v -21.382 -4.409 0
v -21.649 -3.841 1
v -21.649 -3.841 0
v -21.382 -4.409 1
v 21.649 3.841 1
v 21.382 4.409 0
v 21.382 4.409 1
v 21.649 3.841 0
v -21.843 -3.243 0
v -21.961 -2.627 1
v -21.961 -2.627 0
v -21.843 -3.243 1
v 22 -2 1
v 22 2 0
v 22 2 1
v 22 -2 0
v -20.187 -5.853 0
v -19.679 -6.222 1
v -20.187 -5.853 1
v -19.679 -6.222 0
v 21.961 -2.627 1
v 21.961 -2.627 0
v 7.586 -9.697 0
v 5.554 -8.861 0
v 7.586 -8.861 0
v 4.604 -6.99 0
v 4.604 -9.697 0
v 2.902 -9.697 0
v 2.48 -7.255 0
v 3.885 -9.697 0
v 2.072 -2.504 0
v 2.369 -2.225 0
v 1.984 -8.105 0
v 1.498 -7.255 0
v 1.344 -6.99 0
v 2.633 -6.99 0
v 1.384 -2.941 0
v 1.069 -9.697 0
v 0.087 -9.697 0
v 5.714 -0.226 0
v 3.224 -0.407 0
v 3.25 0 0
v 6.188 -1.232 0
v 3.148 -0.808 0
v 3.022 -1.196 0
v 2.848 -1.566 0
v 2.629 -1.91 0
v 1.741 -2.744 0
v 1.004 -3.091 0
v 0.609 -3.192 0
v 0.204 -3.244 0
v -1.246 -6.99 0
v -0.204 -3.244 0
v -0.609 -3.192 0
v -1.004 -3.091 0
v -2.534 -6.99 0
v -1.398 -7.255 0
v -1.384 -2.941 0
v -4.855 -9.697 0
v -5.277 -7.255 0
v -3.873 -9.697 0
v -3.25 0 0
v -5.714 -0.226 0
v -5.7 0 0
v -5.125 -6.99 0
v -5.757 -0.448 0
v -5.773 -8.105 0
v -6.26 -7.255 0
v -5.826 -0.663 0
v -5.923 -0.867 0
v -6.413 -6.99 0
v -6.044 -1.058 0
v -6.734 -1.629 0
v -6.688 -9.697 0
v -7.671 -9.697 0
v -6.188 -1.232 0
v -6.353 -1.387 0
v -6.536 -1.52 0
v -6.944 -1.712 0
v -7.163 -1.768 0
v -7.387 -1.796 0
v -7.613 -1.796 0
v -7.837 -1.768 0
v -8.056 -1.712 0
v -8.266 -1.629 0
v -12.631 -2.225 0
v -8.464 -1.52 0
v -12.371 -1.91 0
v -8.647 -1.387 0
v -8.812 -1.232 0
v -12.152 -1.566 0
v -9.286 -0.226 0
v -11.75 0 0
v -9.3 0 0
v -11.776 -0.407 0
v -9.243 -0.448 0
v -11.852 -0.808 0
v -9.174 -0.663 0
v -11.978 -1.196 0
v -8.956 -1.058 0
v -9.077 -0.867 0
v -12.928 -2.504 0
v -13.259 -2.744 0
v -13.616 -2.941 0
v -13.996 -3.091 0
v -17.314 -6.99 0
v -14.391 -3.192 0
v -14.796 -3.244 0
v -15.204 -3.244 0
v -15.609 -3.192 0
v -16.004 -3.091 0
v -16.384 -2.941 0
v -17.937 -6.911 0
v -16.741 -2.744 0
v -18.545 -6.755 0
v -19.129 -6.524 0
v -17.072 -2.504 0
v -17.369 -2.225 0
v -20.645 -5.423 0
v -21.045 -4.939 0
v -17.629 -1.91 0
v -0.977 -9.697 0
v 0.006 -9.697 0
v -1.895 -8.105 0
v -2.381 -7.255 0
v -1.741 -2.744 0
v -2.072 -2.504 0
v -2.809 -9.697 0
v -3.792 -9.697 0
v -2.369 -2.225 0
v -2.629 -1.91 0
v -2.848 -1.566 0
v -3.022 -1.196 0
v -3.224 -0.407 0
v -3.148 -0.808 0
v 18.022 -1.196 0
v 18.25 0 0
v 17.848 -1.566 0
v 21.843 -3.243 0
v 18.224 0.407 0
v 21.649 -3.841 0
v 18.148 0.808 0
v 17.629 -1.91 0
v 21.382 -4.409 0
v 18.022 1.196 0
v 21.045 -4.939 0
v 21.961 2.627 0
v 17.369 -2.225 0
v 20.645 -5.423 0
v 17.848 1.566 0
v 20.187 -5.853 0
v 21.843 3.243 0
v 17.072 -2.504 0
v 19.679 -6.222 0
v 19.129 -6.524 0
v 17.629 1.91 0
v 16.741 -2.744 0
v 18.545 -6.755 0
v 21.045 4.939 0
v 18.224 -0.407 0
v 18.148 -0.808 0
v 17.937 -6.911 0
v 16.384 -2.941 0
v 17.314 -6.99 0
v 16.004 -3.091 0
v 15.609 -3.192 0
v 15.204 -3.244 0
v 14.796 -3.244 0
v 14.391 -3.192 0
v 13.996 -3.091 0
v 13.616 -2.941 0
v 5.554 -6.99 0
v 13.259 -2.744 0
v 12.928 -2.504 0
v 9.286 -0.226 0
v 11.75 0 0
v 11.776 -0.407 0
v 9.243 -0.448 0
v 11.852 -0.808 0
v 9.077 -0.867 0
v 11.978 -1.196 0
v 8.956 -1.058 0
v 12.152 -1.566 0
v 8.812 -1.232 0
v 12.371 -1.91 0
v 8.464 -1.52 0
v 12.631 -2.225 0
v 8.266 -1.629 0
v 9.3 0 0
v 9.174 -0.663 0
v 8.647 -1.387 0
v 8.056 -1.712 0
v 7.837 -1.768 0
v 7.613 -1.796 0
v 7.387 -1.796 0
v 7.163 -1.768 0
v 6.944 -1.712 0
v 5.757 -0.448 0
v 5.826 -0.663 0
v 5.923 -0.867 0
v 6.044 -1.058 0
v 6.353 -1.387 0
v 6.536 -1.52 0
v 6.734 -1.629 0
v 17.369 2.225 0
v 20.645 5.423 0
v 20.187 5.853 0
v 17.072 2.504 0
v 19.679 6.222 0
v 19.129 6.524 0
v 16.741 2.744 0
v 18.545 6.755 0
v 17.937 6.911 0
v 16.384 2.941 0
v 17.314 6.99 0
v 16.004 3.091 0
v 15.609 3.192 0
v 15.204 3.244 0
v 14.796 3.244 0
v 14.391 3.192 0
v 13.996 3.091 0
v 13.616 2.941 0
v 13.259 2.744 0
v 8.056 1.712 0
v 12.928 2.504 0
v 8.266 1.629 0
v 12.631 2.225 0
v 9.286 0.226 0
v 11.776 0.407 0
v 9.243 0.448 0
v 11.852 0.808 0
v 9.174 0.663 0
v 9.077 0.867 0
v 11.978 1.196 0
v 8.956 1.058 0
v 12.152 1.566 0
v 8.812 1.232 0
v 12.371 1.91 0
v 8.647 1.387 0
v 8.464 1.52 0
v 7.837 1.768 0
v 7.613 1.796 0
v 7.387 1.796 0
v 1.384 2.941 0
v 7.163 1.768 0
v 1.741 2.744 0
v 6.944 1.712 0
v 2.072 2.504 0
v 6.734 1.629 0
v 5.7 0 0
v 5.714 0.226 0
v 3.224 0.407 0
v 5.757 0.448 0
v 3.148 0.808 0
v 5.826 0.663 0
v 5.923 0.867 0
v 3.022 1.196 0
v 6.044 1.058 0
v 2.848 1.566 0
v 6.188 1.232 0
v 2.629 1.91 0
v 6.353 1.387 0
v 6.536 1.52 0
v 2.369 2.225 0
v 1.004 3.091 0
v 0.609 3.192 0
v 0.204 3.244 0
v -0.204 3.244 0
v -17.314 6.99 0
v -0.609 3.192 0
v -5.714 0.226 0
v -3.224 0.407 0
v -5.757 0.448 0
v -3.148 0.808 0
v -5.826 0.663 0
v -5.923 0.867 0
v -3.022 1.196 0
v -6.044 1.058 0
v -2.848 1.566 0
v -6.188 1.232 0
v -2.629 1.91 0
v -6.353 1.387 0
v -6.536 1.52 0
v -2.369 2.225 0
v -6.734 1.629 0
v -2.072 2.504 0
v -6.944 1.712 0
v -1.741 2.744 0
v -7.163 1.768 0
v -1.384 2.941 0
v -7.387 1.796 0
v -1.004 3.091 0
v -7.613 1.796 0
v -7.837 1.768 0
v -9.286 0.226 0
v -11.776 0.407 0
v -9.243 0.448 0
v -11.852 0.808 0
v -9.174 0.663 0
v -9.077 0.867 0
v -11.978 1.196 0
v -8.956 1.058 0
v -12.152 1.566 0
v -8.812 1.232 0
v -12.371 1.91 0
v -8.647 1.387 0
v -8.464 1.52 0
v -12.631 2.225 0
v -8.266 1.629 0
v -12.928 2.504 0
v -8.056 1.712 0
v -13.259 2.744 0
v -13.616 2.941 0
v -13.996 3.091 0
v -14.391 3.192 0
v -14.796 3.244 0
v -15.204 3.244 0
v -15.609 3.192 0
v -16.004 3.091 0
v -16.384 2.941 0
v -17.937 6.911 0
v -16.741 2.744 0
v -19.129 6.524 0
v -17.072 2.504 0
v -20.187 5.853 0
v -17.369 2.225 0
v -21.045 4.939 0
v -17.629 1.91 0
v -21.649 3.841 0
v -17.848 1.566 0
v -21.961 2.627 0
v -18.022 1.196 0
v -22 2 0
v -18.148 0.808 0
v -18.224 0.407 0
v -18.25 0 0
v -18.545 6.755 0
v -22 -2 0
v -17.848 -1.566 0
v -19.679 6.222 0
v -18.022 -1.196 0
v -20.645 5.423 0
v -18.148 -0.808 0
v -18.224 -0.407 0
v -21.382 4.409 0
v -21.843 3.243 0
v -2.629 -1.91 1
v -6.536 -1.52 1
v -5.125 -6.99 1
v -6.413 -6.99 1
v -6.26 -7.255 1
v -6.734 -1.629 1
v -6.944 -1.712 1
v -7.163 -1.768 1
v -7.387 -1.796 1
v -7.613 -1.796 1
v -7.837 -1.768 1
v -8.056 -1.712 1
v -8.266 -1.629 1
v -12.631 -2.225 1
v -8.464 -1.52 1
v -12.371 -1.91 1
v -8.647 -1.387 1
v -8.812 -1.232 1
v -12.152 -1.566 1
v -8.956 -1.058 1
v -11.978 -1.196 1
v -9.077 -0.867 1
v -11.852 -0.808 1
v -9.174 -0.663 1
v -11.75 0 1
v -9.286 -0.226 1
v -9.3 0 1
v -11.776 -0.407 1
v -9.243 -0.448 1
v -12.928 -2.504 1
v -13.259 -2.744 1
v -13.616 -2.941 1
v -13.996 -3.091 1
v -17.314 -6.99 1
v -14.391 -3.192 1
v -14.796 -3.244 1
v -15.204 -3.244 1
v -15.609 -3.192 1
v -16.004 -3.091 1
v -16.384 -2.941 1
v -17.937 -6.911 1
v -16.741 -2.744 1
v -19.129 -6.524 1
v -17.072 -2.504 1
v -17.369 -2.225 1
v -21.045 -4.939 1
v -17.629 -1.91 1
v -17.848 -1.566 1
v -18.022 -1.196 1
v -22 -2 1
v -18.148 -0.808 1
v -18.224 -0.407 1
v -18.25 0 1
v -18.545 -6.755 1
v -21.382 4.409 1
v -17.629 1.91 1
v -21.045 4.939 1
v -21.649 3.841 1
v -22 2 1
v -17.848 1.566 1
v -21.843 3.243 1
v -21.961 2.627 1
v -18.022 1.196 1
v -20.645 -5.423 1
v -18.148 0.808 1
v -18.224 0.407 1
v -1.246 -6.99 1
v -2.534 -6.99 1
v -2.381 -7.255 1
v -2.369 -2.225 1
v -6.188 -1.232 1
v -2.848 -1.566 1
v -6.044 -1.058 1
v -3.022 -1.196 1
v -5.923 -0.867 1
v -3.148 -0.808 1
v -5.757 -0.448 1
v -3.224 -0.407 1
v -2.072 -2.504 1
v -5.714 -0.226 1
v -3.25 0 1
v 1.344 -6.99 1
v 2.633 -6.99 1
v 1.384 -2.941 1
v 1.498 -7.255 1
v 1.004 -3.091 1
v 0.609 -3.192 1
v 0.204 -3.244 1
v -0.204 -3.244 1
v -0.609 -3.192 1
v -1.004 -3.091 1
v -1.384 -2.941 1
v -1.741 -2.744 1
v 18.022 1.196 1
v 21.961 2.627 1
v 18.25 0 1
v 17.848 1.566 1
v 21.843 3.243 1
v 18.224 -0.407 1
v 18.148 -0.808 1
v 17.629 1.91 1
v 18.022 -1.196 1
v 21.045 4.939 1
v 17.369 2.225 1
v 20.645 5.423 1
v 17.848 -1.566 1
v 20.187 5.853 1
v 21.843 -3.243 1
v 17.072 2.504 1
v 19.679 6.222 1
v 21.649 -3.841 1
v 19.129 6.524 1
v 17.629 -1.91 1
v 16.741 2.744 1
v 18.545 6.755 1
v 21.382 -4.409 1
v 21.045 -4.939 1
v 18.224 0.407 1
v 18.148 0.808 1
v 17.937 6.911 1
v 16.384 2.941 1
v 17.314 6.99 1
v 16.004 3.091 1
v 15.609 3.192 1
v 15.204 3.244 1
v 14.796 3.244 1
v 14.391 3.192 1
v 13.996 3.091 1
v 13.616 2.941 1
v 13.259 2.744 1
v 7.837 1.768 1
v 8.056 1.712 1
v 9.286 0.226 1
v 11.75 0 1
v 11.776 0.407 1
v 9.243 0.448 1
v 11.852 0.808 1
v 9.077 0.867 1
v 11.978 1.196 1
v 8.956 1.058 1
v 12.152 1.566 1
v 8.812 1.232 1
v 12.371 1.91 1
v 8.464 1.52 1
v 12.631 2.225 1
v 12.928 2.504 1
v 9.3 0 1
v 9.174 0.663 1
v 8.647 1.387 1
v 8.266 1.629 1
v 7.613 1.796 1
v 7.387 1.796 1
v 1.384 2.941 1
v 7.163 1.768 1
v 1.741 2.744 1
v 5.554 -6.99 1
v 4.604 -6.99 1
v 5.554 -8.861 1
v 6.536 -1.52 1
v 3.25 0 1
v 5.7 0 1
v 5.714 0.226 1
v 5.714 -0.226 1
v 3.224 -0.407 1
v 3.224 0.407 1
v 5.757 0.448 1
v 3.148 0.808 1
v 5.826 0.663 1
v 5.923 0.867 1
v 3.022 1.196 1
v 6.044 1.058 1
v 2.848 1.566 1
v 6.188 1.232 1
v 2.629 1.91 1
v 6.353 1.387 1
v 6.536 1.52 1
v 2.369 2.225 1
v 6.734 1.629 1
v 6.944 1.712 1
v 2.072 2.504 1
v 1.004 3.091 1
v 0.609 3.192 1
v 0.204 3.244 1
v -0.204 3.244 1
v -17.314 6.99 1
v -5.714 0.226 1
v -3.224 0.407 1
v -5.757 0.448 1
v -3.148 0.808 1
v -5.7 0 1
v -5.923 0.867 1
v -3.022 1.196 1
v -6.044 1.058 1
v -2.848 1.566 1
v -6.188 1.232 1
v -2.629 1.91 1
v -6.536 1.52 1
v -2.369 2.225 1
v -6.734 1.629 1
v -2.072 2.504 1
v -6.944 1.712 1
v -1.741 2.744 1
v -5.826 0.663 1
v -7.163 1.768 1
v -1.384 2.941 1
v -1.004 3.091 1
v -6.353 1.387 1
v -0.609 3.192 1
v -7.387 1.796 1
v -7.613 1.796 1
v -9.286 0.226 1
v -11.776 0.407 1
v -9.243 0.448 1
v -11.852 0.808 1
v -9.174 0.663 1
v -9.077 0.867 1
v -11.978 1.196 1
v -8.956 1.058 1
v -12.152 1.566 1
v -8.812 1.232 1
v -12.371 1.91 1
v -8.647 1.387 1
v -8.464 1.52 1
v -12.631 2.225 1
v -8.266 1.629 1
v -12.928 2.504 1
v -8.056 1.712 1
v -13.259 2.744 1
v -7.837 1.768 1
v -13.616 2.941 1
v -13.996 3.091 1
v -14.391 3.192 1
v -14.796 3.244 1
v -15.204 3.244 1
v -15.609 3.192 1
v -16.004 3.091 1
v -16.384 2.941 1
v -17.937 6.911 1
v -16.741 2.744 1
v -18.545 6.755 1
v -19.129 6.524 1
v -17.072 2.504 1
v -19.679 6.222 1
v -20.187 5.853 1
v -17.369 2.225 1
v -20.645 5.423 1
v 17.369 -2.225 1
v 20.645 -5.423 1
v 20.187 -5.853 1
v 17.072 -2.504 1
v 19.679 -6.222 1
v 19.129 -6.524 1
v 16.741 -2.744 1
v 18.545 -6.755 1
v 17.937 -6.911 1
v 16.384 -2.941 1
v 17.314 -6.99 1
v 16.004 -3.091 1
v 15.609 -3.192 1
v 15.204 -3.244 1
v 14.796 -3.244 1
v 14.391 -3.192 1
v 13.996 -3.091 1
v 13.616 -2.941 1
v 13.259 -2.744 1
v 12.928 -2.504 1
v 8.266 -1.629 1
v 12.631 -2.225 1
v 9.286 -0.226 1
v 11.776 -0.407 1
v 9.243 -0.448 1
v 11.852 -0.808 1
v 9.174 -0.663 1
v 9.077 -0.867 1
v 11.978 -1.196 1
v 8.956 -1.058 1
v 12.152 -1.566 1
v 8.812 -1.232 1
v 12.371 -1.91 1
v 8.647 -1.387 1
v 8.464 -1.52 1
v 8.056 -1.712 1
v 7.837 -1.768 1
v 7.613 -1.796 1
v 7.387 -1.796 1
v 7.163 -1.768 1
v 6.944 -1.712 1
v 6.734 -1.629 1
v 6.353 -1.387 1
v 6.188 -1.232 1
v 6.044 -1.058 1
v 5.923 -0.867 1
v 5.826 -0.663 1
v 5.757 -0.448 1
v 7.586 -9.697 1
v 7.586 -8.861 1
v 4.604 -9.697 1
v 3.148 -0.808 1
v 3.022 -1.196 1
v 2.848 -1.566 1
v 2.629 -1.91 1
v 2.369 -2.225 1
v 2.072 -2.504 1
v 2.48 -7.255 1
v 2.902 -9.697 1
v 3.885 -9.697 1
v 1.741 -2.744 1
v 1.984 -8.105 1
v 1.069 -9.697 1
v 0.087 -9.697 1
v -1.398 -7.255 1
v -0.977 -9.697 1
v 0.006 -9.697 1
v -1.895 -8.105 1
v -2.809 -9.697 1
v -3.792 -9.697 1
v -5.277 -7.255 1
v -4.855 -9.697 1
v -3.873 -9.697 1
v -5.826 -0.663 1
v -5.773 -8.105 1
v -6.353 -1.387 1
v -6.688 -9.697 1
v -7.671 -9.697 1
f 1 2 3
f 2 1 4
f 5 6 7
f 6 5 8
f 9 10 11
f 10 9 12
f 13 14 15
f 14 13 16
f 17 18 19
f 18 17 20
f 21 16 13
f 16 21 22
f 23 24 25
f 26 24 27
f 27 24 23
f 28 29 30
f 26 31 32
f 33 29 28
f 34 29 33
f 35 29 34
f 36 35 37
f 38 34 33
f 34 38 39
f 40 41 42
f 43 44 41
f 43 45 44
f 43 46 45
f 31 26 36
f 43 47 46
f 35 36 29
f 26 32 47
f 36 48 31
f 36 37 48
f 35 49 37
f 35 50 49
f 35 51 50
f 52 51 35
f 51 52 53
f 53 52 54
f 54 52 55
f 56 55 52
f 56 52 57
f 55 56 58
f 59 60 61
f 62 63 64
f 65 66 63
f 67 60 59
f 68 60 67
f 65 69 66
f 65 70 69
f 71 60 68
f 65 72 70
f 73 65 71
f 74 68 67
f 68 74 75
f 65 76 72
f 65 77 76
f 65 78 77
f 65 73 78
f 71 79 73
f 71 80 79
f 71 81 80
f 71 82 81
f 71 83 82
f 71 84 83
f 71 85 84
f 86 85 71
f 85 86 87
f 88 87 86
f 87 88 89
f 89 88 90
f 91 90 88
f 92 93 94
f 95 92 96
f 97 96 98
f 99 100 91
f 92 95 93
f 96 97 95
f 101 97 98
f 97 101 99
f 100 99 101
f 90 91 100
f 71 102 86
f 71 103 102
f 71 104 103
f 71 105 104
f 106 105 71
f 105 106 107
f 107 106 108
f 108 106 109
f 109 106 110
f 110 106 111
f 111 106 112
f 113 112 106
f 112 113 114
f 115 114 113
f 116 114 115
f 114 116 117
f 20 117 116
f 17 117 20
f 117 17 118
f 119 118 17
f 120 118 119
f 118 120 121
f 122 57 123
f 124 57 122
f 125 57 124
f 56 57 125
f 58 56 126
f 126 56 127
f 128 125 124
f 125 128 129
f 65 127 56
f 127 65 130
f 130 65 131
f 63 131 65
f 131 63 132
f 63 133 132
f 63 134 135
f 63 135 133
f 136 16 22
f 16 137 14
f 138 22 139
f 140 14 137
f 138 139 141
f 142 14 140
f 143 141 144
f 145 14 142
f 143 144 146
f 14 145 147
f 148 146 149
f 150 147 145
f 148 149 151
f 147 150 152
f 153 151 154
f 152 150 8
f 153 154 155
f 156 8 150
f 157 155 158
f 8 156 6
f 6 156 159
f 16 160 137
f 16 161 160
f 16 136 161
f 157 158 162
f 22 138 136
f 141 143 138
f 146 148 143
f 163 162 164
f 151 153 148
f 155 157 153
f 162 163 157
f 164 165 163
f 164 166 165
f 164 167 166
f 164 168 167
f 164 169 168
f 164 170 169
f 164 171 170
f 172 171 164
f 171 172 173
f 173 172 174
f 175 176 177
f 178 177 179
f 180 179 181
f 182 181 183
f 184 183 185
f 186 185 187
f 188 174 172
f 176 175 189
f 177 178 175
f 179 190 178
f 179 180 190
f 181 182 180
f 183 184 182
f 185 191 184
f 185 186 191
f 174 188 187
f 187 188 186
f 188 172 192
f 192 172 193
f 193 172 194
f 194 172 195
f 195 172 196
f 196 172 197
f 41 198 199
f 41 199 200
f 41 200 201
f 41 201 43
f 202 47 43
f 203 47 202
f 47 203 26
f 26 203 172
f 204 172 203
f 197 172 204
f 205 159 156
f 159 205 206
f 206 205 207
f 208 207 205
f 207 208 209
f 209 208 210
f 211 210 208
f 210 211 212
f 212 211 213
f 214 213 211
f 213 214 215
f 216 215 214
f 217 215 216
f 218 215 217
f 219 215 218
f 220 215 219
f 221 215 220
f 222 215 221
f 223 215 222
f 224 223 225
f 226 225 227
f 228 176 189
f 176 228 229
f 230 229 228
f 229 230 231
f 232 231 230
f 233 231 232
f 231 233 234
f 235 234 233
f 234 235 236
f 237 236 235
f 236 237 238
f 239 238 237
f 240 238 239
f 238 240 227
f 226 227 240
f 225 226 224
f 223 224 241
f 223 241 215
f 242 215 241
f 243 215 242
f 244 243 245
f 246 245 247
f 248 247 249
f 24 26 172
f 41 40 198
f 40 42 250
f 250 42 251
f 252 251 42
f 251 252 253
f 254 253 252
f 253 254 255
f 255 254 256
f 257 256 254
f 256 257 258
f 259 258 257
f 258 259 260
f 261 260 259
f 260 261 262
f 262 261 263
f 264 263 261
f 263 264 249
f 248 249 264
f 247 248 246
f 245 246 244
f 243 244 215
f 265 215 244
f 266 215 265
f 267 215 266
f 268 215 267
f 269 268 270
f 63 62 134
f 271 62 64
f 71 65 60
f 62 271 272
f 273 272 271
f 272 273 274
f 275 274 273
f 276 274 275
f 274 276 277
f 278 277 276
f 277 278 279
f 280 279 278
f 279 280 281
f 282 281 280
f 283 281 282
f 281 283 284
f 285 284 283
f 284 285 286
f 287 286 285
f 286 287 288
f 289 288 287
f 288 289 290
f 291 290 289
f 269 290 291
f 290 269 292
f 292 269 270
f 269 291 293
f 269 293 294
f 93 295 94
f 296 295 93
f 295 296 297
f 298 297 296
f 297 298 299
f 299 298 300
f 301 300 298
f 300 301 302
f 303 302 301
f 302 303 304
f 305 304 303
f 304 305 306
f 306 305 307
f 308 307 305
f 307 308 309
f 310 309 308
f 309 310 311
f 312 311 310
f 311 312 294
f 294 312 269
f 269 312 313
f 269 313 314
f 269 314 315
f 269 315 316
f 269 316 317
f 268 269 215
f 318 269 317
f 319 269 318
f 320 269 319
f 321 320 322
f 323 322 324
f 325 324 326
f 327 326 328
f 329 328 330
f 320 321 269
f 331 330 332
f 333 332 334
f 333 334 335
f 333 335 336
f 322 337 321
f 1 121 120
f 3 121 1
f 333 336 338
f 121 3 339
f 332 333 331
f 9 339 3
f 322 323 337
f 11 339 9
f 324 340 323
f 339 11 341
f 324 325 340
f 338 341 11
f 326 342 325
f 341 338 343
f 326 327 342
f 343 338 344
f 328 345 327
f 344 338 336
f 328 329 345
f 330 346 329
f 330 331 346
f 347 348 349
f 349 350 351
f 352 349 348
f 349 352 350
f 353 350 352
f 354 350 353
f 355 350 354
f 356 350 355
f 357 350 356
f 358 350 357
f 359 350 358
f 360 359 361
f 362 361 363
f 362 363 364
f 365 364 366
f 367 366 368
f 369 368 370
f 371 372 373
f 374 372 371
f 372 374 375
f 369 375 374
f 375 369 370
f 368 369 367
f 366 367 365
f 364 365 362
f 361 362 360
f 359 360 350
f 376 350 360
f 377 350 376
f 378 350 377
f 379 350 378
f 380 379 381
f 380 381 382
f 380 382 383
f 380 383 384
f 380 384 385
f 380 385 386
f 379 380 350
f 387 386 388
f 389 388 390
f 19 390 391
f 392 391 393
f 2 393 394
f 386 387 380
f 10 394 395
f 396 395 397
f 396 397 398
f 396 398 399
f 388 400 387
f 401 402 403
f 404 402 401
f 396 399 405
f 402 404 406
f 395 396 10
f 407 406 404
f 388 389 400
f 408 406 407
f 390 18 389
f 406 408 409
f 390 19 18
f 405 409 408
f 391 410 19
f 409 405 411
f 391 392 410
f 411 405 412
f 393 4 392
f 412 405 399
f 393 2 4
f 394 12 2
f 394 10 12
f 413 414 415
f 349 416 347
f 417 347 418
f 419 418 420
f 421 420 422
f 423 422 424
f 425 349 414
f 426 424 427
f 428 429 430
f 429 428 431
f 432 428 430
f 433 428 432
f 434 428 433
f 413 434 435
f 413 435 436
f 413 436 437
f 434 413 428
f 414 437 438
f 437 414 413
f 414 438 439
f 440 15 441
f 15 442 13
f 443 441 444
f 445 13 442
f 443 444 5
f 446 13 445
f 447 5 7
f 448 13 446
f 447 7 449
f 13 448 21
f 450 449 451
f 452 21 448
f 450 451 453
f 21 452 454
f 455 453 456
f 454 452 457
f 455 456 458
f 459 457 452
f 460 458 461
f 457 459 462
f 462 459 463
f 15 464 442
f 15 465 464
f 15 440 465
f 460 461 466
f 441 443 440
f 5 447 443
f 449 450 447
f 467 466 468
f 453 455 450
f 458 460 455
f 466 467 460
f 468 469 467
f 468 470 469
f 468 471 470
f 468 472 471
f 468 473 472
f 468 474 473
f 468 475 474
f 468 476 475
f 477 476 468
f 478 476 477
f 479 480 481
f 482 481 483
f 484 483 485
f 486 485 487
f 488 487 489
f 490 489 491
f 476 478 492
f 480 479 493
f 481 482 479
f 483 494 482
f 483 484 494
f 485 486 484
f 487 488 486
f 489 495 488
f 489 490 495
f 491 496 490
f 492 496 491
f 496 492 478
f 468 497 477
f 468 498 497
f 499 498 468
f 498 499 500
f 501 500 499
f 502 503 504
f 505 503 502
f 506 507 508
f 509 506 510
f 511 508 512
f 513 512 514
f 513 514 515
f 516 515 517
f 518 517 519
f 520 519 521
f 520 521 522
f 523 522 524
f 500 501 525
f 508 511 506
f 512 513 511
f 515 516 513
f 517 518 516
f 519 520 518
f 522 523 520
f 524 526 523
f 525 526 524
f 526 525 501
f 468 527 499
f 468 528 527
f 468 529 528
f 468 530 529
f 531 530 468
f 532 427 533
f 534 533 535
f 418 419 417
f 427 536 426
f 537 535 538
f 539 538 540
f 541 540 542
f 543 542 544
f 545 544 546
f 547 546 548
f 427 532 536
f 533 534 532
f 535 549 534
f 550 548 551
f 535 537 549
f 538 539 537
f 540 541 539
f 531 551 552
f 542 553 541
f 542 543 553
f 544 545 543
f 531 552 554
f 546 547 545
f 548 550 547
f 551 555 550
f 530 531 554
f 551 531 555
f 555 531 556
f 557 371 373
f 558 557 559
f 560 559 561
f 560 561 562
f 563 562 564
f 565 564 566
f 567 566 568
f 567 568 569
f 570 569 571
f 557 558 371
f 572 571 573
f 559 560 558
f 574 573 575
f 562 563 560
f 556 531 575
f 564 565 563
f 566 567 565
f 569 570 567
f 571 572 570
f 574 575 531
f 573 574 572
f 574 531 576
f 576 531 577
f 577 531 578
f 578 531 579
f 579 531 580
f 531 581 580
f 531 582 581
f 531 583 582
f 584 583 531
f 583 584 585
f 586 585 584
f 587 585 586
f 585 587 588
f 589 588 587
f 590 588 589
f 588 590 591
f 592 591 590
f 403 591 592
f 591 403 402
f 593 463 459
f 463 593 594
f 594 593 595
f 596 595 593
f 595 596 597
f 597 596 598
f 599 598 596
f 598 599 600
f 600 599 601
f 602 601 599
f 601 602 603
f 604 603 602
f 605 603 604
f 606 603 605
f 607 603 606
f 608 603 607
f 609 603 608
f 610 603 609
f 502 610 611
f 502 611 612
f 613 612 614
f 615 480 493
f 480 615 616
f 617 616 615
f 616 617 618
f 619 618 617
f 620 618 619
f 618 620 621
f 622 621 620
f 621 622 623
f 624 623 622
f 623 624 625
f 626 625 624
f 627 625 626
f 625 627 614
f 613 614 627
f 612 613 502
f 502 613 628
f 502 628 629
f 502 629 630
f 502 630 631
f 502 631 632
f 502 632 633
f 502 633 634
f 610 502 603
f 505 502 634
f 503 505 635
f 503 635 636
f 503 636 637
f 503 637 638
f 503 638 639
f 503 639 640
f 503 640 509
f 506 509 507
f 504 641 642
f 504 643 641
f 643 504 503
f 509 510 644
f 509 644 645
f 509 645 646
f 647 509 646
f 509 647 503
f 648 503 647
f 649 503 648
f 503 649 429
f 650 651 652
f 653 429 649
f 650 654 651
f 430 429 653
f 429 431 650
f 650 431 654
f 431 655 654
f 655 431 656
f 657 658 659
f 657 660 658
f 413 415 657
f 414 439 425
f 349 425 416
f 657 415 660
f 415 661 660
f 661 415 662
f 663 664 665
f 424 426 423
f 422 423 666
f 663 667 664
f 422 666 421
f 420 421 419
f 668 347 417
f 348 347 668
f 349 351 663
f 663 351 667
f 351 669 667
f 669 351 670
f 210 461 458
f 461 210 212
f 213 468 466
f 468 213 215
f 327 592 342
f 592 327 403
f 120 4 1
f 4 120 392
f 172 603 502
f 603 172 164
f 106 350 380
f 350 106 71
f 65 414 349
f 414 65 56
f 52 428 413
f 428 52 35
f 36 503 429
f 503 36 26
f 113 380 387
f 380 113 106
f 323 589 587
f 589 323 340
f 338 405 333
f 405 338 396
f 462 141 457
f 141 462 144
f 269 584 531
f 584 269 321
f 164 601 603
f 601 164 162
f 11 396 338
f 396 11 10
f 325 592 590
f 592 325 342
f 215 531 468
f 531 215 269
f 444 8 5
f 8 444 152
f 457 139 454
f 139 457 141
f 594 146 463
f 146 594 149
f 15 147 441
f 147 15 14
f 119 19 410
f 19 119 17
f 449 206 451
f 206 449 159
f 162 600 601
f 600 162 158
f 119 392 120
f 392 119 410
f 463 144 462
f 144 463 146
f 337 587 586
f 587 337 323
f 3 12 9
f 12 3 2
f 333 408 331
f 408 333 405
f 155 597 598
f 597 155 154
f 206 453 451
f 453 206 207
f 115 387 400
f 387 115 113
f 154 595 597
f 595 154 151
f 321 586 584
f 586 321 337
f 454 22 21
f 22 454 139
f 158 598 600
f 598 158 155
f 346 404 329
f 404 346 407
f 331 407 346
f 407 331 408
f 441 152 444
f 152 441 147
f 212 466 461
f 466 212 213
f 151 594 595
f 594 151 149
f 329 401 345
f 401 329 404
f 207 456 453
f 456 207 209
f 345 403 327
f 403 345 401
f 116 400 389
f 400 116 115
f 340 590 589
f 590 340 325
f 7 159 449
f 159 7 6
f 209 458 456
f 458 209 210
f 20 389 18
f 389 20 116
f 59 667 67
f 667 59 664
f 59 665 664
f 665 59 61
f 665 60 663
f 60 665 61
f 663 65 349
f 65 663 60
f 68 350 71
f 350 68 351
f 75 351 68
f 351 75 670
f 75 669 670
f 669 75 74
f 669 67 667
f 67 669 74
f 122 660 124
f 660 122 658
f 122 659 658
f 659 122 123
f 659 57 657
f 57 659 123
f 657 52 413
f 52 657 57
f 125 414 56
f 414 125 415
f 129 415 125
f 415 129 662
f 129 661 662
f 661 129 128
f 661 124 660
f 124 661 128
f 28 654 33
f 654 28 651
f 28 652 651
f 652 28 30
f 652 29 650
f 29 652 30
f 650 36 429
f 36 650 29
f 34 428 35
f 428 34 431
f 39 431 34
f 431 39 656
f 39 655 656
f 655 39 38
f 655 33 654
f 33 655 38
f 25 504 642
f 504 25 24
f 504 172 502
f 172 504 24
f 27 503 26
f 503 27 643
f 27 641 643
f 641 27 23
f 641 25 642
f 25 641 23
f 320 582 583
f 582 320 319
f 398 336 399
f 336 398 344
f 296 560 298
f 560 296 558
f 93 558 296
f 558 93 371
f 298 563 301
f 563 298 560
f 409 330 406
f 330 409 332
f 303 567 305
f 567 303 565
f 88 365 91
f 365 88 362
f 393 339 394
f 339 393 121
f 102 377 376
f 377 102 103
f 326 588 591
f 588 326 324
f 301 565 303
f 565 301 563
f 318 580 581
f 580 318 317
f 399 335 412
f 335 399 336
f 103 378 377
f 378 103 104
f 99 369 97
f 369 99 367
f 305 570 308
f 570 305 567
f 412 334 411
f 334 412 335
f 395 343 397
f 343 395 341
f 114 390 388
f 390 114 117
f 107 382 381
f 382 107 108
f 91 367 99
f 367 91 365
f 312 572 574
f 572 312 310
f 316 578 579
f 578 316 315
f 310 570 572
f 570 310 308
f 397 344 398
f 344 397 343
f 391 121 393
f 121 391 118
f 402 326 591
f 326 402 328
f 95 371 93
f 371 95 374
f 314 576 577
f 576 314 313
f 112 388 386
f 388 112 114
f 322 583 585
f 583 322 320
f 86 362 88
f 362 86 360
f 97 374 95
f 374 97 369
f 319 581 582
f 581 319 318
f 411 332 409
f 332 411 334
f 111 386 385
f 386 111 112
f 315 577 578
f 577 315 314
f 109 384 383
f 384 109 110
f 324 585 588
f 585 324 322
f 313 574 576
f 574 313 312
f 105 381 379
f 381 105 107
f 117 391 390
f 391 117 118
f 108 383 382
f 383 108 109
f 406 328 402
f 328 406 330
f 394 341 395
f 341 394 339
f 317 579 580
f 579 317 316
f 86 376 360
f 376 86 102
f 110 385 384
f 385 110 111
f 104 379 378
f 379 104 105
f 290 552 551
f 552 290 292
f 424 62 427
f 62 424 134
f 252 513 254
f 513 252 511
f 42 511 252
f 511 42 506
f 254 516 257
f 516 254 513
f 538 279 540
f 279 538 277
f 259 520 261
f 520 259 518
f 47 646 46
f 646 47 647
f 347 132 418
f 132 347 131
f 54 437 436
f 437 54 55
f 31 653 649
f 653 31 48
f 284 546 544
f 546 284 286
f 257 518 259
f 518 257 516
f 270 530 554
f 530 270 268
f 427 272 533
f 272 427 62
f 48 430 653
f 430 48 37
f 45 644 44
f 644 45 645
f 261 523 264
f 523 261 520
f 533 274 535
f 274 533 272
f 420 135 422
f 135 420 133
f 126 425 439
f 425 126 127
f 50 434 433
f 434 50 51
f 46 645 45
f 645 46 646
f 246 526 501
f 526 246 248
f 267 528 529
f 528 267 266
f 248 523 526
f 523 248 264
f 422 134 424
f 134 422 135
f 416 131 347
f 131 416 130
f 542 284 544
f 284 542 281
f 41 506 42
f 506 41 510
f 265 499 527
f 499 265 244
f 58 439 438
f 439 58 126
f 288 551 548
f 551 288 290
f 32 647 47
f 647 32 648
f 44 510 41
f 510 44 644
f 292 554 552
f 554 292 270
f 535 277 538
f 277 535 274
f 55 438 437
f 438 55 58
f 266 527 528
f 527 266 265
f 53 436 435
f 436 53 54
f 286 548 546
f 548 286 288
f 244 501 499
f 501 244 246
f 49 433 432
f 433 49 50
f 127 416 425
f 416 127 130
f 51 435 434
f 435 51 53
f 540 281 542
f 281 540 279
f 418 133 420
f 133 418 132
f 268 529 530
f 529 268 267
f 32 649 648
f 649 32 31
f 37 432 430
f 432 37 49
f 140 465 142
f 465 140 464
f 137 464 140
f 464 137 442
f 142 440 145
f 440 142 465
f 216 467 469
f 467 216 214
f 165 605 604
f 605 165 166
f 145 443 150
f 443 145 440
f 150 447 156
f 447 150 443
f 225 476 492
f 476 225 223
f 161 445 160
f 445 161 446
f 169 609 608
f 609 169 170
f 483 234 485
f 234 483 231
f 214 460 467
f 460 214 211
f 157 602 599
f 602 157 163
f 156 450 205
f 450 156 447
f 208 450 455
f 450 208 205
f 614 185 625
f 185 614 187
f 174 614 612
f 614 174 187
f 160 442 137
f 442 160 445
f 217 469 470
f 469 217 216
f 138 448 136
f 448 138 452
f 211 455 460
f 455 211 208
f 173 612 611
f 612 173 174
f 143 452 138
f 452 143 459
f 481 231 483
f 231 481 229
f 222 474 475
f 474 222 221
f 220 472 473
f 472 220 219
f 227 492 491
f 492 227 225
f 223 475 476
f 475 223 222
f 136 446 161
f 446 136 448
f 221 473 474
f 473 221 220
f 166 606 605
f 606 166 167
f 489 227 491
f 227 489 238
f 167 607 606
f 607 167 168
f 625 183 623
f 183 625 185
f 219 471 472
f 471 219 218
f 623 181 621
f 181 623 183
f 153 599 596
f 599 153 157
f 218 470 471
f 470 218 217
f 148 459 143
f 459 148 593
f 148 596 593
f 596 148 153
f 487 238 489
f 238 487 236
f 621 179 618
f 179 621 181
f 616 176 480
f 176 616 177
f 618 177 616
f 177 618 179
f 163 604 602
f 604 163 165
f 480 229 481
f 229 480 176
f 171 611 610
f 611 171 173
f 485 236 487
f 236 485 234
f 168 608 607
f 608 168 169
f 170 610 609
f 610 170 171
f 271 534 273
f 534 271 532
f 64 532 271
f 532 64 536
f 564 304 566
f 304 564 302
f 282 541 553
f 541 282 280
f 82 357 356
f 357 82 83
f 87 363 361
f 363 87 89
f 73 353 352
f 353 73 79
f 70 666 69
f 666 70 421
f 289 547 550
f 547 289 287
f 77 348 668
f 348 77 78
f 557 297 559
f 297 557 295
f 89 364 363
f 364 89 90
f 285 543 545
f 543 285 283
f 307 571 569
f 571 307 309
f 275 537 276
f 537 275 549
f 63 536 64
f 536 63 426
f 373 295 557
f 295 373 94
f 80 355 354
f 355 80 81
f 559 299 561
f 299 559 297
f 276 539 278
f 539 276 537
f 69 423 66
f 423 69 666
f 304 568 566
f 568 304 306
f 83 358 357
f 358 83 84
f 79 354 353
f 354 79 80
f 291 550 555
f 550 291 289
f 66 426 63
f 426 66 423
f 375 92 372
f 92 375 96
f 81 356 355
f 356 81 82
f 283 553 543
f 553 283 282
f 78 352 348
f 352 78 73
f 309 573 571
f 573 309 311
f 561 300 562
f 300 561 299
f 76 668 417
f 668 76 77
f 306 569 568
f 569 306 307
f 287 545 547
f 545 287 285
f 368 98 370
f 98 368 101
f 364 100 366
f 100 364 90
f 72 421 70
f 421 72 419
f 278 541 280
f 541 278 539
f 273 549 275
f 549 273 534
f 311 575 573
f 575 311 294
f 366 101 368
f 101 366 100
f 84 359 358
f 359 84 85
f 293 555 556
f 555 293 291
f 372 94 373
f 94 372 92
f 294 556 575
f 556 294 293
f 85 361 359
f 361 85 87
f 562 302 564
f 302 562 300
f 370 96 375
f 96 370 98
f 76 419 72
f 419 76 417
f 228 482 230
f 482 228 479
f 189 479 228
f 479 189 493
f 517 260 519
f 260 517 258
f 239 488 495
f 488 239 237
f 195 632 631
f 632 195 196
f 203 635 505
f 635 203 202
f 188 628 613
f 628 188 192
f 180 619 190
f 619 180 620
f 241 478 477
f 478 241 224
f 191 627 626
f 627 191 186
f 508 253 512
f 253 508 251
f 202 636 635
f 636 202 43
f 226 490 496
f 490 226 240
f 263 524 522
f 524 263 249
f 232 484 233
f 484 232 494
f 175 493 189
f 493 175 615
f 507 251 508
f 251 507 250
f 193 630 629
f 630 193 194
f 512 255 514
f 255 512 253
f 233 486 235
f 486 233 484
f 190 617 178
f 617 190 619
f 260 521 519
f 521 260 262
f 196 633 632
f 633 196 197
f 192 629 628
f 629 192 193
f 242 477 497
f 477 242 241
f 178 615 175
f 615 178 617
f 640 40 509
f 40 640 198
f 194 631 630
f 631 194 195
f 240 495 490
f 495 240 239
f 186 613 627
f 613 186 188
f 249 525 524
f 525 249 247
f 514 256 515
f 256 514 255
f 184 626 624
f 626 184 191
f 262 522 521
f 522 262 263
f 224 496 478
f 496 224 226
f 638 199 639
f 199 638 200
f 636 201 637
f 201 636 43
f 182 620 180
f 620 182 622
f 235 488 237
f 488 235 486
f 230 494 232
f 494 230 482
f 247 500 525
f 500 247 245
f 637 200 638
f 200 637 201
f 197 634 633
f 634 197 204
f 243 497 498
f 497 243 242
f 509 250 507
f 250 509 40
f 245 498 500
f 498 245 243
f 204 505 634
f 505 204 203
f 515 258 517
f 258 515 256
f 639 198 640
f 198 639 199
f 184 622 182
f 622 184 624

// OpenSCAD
$fn = 50;


difference() {
	union() {
		hull() {
			translate(v = [-17.0000000000, 2.0000000000, 0]) {
				cylinder(h = 1, r = 5);
			}
			translate(v = [17.0000000000, 2.0000000000, 0]) {
				cylinder(h = 1, r = 5);
			}
			translate(v = [-17.0000000000, -2.0000000000, 0]) {
				cylinder(h = 1, r = 5);
			}
			translate(v = [17.0000000000, -2.0000000000, 0]) {
				cylinder(h = 1, r = 5);
			}
		}
		translate(v = [0, -5, 0]) {
			linear_extrude(height = 1) {
				text(font = "DejaVu Sans Mono:style=Bold", halign = "center", size = 4.7500000000, text = "XXXL", valign = "top");
			}
		}
	}
	union() {
		translate(v = [-15.0000000000, 0.0000000000, 0]) {
			translate(v = [0, 0, -100]) {
				cylinder(h = 200, r = 3.2500000000);
			}
		}
		translate(v = [0, 0, -100]) {
			cylinder(h = 200, r = 3.2500000000);
		}
		translate(v = [15.0000000000, 0.0000000000, 0]) {
			translate(v = [0, 0, -100]) {
				cylinder(h = 200, r = 3.2500000000);
			}
		}
		translate(v = [-15.0000000000, 0.0000000000, 0]) {
			translate(v = [0, 0, -100]) {
				cylinder(h = 200, r = 1.8000000000);
			}
		}
		translate(v = [-7.5000000000, 0.0000000000, 0]) {
			translate(v = [0, 0, -100]) {
				cylinder(h = 200, r = 1.8000000000);
			}
		}
		translate(v = [0, 0, -100]) {
			cylinder(h = 200, r = 1.8000000000);
		}
		translate(v = [7.5000000000, 0.0000000000, 0]) {
			translate(v = [0, 0, -100]) {
				cylinder(h = 200, r = 1.8000000000);
			}
		}
		translate(v = [15.0000000000, 0.0000000000, 0]) {
			translate(v = [0, 0, -100]) {
				cylinder(h = 200, r = 1.8000000000);
			}
		}
	}
}
